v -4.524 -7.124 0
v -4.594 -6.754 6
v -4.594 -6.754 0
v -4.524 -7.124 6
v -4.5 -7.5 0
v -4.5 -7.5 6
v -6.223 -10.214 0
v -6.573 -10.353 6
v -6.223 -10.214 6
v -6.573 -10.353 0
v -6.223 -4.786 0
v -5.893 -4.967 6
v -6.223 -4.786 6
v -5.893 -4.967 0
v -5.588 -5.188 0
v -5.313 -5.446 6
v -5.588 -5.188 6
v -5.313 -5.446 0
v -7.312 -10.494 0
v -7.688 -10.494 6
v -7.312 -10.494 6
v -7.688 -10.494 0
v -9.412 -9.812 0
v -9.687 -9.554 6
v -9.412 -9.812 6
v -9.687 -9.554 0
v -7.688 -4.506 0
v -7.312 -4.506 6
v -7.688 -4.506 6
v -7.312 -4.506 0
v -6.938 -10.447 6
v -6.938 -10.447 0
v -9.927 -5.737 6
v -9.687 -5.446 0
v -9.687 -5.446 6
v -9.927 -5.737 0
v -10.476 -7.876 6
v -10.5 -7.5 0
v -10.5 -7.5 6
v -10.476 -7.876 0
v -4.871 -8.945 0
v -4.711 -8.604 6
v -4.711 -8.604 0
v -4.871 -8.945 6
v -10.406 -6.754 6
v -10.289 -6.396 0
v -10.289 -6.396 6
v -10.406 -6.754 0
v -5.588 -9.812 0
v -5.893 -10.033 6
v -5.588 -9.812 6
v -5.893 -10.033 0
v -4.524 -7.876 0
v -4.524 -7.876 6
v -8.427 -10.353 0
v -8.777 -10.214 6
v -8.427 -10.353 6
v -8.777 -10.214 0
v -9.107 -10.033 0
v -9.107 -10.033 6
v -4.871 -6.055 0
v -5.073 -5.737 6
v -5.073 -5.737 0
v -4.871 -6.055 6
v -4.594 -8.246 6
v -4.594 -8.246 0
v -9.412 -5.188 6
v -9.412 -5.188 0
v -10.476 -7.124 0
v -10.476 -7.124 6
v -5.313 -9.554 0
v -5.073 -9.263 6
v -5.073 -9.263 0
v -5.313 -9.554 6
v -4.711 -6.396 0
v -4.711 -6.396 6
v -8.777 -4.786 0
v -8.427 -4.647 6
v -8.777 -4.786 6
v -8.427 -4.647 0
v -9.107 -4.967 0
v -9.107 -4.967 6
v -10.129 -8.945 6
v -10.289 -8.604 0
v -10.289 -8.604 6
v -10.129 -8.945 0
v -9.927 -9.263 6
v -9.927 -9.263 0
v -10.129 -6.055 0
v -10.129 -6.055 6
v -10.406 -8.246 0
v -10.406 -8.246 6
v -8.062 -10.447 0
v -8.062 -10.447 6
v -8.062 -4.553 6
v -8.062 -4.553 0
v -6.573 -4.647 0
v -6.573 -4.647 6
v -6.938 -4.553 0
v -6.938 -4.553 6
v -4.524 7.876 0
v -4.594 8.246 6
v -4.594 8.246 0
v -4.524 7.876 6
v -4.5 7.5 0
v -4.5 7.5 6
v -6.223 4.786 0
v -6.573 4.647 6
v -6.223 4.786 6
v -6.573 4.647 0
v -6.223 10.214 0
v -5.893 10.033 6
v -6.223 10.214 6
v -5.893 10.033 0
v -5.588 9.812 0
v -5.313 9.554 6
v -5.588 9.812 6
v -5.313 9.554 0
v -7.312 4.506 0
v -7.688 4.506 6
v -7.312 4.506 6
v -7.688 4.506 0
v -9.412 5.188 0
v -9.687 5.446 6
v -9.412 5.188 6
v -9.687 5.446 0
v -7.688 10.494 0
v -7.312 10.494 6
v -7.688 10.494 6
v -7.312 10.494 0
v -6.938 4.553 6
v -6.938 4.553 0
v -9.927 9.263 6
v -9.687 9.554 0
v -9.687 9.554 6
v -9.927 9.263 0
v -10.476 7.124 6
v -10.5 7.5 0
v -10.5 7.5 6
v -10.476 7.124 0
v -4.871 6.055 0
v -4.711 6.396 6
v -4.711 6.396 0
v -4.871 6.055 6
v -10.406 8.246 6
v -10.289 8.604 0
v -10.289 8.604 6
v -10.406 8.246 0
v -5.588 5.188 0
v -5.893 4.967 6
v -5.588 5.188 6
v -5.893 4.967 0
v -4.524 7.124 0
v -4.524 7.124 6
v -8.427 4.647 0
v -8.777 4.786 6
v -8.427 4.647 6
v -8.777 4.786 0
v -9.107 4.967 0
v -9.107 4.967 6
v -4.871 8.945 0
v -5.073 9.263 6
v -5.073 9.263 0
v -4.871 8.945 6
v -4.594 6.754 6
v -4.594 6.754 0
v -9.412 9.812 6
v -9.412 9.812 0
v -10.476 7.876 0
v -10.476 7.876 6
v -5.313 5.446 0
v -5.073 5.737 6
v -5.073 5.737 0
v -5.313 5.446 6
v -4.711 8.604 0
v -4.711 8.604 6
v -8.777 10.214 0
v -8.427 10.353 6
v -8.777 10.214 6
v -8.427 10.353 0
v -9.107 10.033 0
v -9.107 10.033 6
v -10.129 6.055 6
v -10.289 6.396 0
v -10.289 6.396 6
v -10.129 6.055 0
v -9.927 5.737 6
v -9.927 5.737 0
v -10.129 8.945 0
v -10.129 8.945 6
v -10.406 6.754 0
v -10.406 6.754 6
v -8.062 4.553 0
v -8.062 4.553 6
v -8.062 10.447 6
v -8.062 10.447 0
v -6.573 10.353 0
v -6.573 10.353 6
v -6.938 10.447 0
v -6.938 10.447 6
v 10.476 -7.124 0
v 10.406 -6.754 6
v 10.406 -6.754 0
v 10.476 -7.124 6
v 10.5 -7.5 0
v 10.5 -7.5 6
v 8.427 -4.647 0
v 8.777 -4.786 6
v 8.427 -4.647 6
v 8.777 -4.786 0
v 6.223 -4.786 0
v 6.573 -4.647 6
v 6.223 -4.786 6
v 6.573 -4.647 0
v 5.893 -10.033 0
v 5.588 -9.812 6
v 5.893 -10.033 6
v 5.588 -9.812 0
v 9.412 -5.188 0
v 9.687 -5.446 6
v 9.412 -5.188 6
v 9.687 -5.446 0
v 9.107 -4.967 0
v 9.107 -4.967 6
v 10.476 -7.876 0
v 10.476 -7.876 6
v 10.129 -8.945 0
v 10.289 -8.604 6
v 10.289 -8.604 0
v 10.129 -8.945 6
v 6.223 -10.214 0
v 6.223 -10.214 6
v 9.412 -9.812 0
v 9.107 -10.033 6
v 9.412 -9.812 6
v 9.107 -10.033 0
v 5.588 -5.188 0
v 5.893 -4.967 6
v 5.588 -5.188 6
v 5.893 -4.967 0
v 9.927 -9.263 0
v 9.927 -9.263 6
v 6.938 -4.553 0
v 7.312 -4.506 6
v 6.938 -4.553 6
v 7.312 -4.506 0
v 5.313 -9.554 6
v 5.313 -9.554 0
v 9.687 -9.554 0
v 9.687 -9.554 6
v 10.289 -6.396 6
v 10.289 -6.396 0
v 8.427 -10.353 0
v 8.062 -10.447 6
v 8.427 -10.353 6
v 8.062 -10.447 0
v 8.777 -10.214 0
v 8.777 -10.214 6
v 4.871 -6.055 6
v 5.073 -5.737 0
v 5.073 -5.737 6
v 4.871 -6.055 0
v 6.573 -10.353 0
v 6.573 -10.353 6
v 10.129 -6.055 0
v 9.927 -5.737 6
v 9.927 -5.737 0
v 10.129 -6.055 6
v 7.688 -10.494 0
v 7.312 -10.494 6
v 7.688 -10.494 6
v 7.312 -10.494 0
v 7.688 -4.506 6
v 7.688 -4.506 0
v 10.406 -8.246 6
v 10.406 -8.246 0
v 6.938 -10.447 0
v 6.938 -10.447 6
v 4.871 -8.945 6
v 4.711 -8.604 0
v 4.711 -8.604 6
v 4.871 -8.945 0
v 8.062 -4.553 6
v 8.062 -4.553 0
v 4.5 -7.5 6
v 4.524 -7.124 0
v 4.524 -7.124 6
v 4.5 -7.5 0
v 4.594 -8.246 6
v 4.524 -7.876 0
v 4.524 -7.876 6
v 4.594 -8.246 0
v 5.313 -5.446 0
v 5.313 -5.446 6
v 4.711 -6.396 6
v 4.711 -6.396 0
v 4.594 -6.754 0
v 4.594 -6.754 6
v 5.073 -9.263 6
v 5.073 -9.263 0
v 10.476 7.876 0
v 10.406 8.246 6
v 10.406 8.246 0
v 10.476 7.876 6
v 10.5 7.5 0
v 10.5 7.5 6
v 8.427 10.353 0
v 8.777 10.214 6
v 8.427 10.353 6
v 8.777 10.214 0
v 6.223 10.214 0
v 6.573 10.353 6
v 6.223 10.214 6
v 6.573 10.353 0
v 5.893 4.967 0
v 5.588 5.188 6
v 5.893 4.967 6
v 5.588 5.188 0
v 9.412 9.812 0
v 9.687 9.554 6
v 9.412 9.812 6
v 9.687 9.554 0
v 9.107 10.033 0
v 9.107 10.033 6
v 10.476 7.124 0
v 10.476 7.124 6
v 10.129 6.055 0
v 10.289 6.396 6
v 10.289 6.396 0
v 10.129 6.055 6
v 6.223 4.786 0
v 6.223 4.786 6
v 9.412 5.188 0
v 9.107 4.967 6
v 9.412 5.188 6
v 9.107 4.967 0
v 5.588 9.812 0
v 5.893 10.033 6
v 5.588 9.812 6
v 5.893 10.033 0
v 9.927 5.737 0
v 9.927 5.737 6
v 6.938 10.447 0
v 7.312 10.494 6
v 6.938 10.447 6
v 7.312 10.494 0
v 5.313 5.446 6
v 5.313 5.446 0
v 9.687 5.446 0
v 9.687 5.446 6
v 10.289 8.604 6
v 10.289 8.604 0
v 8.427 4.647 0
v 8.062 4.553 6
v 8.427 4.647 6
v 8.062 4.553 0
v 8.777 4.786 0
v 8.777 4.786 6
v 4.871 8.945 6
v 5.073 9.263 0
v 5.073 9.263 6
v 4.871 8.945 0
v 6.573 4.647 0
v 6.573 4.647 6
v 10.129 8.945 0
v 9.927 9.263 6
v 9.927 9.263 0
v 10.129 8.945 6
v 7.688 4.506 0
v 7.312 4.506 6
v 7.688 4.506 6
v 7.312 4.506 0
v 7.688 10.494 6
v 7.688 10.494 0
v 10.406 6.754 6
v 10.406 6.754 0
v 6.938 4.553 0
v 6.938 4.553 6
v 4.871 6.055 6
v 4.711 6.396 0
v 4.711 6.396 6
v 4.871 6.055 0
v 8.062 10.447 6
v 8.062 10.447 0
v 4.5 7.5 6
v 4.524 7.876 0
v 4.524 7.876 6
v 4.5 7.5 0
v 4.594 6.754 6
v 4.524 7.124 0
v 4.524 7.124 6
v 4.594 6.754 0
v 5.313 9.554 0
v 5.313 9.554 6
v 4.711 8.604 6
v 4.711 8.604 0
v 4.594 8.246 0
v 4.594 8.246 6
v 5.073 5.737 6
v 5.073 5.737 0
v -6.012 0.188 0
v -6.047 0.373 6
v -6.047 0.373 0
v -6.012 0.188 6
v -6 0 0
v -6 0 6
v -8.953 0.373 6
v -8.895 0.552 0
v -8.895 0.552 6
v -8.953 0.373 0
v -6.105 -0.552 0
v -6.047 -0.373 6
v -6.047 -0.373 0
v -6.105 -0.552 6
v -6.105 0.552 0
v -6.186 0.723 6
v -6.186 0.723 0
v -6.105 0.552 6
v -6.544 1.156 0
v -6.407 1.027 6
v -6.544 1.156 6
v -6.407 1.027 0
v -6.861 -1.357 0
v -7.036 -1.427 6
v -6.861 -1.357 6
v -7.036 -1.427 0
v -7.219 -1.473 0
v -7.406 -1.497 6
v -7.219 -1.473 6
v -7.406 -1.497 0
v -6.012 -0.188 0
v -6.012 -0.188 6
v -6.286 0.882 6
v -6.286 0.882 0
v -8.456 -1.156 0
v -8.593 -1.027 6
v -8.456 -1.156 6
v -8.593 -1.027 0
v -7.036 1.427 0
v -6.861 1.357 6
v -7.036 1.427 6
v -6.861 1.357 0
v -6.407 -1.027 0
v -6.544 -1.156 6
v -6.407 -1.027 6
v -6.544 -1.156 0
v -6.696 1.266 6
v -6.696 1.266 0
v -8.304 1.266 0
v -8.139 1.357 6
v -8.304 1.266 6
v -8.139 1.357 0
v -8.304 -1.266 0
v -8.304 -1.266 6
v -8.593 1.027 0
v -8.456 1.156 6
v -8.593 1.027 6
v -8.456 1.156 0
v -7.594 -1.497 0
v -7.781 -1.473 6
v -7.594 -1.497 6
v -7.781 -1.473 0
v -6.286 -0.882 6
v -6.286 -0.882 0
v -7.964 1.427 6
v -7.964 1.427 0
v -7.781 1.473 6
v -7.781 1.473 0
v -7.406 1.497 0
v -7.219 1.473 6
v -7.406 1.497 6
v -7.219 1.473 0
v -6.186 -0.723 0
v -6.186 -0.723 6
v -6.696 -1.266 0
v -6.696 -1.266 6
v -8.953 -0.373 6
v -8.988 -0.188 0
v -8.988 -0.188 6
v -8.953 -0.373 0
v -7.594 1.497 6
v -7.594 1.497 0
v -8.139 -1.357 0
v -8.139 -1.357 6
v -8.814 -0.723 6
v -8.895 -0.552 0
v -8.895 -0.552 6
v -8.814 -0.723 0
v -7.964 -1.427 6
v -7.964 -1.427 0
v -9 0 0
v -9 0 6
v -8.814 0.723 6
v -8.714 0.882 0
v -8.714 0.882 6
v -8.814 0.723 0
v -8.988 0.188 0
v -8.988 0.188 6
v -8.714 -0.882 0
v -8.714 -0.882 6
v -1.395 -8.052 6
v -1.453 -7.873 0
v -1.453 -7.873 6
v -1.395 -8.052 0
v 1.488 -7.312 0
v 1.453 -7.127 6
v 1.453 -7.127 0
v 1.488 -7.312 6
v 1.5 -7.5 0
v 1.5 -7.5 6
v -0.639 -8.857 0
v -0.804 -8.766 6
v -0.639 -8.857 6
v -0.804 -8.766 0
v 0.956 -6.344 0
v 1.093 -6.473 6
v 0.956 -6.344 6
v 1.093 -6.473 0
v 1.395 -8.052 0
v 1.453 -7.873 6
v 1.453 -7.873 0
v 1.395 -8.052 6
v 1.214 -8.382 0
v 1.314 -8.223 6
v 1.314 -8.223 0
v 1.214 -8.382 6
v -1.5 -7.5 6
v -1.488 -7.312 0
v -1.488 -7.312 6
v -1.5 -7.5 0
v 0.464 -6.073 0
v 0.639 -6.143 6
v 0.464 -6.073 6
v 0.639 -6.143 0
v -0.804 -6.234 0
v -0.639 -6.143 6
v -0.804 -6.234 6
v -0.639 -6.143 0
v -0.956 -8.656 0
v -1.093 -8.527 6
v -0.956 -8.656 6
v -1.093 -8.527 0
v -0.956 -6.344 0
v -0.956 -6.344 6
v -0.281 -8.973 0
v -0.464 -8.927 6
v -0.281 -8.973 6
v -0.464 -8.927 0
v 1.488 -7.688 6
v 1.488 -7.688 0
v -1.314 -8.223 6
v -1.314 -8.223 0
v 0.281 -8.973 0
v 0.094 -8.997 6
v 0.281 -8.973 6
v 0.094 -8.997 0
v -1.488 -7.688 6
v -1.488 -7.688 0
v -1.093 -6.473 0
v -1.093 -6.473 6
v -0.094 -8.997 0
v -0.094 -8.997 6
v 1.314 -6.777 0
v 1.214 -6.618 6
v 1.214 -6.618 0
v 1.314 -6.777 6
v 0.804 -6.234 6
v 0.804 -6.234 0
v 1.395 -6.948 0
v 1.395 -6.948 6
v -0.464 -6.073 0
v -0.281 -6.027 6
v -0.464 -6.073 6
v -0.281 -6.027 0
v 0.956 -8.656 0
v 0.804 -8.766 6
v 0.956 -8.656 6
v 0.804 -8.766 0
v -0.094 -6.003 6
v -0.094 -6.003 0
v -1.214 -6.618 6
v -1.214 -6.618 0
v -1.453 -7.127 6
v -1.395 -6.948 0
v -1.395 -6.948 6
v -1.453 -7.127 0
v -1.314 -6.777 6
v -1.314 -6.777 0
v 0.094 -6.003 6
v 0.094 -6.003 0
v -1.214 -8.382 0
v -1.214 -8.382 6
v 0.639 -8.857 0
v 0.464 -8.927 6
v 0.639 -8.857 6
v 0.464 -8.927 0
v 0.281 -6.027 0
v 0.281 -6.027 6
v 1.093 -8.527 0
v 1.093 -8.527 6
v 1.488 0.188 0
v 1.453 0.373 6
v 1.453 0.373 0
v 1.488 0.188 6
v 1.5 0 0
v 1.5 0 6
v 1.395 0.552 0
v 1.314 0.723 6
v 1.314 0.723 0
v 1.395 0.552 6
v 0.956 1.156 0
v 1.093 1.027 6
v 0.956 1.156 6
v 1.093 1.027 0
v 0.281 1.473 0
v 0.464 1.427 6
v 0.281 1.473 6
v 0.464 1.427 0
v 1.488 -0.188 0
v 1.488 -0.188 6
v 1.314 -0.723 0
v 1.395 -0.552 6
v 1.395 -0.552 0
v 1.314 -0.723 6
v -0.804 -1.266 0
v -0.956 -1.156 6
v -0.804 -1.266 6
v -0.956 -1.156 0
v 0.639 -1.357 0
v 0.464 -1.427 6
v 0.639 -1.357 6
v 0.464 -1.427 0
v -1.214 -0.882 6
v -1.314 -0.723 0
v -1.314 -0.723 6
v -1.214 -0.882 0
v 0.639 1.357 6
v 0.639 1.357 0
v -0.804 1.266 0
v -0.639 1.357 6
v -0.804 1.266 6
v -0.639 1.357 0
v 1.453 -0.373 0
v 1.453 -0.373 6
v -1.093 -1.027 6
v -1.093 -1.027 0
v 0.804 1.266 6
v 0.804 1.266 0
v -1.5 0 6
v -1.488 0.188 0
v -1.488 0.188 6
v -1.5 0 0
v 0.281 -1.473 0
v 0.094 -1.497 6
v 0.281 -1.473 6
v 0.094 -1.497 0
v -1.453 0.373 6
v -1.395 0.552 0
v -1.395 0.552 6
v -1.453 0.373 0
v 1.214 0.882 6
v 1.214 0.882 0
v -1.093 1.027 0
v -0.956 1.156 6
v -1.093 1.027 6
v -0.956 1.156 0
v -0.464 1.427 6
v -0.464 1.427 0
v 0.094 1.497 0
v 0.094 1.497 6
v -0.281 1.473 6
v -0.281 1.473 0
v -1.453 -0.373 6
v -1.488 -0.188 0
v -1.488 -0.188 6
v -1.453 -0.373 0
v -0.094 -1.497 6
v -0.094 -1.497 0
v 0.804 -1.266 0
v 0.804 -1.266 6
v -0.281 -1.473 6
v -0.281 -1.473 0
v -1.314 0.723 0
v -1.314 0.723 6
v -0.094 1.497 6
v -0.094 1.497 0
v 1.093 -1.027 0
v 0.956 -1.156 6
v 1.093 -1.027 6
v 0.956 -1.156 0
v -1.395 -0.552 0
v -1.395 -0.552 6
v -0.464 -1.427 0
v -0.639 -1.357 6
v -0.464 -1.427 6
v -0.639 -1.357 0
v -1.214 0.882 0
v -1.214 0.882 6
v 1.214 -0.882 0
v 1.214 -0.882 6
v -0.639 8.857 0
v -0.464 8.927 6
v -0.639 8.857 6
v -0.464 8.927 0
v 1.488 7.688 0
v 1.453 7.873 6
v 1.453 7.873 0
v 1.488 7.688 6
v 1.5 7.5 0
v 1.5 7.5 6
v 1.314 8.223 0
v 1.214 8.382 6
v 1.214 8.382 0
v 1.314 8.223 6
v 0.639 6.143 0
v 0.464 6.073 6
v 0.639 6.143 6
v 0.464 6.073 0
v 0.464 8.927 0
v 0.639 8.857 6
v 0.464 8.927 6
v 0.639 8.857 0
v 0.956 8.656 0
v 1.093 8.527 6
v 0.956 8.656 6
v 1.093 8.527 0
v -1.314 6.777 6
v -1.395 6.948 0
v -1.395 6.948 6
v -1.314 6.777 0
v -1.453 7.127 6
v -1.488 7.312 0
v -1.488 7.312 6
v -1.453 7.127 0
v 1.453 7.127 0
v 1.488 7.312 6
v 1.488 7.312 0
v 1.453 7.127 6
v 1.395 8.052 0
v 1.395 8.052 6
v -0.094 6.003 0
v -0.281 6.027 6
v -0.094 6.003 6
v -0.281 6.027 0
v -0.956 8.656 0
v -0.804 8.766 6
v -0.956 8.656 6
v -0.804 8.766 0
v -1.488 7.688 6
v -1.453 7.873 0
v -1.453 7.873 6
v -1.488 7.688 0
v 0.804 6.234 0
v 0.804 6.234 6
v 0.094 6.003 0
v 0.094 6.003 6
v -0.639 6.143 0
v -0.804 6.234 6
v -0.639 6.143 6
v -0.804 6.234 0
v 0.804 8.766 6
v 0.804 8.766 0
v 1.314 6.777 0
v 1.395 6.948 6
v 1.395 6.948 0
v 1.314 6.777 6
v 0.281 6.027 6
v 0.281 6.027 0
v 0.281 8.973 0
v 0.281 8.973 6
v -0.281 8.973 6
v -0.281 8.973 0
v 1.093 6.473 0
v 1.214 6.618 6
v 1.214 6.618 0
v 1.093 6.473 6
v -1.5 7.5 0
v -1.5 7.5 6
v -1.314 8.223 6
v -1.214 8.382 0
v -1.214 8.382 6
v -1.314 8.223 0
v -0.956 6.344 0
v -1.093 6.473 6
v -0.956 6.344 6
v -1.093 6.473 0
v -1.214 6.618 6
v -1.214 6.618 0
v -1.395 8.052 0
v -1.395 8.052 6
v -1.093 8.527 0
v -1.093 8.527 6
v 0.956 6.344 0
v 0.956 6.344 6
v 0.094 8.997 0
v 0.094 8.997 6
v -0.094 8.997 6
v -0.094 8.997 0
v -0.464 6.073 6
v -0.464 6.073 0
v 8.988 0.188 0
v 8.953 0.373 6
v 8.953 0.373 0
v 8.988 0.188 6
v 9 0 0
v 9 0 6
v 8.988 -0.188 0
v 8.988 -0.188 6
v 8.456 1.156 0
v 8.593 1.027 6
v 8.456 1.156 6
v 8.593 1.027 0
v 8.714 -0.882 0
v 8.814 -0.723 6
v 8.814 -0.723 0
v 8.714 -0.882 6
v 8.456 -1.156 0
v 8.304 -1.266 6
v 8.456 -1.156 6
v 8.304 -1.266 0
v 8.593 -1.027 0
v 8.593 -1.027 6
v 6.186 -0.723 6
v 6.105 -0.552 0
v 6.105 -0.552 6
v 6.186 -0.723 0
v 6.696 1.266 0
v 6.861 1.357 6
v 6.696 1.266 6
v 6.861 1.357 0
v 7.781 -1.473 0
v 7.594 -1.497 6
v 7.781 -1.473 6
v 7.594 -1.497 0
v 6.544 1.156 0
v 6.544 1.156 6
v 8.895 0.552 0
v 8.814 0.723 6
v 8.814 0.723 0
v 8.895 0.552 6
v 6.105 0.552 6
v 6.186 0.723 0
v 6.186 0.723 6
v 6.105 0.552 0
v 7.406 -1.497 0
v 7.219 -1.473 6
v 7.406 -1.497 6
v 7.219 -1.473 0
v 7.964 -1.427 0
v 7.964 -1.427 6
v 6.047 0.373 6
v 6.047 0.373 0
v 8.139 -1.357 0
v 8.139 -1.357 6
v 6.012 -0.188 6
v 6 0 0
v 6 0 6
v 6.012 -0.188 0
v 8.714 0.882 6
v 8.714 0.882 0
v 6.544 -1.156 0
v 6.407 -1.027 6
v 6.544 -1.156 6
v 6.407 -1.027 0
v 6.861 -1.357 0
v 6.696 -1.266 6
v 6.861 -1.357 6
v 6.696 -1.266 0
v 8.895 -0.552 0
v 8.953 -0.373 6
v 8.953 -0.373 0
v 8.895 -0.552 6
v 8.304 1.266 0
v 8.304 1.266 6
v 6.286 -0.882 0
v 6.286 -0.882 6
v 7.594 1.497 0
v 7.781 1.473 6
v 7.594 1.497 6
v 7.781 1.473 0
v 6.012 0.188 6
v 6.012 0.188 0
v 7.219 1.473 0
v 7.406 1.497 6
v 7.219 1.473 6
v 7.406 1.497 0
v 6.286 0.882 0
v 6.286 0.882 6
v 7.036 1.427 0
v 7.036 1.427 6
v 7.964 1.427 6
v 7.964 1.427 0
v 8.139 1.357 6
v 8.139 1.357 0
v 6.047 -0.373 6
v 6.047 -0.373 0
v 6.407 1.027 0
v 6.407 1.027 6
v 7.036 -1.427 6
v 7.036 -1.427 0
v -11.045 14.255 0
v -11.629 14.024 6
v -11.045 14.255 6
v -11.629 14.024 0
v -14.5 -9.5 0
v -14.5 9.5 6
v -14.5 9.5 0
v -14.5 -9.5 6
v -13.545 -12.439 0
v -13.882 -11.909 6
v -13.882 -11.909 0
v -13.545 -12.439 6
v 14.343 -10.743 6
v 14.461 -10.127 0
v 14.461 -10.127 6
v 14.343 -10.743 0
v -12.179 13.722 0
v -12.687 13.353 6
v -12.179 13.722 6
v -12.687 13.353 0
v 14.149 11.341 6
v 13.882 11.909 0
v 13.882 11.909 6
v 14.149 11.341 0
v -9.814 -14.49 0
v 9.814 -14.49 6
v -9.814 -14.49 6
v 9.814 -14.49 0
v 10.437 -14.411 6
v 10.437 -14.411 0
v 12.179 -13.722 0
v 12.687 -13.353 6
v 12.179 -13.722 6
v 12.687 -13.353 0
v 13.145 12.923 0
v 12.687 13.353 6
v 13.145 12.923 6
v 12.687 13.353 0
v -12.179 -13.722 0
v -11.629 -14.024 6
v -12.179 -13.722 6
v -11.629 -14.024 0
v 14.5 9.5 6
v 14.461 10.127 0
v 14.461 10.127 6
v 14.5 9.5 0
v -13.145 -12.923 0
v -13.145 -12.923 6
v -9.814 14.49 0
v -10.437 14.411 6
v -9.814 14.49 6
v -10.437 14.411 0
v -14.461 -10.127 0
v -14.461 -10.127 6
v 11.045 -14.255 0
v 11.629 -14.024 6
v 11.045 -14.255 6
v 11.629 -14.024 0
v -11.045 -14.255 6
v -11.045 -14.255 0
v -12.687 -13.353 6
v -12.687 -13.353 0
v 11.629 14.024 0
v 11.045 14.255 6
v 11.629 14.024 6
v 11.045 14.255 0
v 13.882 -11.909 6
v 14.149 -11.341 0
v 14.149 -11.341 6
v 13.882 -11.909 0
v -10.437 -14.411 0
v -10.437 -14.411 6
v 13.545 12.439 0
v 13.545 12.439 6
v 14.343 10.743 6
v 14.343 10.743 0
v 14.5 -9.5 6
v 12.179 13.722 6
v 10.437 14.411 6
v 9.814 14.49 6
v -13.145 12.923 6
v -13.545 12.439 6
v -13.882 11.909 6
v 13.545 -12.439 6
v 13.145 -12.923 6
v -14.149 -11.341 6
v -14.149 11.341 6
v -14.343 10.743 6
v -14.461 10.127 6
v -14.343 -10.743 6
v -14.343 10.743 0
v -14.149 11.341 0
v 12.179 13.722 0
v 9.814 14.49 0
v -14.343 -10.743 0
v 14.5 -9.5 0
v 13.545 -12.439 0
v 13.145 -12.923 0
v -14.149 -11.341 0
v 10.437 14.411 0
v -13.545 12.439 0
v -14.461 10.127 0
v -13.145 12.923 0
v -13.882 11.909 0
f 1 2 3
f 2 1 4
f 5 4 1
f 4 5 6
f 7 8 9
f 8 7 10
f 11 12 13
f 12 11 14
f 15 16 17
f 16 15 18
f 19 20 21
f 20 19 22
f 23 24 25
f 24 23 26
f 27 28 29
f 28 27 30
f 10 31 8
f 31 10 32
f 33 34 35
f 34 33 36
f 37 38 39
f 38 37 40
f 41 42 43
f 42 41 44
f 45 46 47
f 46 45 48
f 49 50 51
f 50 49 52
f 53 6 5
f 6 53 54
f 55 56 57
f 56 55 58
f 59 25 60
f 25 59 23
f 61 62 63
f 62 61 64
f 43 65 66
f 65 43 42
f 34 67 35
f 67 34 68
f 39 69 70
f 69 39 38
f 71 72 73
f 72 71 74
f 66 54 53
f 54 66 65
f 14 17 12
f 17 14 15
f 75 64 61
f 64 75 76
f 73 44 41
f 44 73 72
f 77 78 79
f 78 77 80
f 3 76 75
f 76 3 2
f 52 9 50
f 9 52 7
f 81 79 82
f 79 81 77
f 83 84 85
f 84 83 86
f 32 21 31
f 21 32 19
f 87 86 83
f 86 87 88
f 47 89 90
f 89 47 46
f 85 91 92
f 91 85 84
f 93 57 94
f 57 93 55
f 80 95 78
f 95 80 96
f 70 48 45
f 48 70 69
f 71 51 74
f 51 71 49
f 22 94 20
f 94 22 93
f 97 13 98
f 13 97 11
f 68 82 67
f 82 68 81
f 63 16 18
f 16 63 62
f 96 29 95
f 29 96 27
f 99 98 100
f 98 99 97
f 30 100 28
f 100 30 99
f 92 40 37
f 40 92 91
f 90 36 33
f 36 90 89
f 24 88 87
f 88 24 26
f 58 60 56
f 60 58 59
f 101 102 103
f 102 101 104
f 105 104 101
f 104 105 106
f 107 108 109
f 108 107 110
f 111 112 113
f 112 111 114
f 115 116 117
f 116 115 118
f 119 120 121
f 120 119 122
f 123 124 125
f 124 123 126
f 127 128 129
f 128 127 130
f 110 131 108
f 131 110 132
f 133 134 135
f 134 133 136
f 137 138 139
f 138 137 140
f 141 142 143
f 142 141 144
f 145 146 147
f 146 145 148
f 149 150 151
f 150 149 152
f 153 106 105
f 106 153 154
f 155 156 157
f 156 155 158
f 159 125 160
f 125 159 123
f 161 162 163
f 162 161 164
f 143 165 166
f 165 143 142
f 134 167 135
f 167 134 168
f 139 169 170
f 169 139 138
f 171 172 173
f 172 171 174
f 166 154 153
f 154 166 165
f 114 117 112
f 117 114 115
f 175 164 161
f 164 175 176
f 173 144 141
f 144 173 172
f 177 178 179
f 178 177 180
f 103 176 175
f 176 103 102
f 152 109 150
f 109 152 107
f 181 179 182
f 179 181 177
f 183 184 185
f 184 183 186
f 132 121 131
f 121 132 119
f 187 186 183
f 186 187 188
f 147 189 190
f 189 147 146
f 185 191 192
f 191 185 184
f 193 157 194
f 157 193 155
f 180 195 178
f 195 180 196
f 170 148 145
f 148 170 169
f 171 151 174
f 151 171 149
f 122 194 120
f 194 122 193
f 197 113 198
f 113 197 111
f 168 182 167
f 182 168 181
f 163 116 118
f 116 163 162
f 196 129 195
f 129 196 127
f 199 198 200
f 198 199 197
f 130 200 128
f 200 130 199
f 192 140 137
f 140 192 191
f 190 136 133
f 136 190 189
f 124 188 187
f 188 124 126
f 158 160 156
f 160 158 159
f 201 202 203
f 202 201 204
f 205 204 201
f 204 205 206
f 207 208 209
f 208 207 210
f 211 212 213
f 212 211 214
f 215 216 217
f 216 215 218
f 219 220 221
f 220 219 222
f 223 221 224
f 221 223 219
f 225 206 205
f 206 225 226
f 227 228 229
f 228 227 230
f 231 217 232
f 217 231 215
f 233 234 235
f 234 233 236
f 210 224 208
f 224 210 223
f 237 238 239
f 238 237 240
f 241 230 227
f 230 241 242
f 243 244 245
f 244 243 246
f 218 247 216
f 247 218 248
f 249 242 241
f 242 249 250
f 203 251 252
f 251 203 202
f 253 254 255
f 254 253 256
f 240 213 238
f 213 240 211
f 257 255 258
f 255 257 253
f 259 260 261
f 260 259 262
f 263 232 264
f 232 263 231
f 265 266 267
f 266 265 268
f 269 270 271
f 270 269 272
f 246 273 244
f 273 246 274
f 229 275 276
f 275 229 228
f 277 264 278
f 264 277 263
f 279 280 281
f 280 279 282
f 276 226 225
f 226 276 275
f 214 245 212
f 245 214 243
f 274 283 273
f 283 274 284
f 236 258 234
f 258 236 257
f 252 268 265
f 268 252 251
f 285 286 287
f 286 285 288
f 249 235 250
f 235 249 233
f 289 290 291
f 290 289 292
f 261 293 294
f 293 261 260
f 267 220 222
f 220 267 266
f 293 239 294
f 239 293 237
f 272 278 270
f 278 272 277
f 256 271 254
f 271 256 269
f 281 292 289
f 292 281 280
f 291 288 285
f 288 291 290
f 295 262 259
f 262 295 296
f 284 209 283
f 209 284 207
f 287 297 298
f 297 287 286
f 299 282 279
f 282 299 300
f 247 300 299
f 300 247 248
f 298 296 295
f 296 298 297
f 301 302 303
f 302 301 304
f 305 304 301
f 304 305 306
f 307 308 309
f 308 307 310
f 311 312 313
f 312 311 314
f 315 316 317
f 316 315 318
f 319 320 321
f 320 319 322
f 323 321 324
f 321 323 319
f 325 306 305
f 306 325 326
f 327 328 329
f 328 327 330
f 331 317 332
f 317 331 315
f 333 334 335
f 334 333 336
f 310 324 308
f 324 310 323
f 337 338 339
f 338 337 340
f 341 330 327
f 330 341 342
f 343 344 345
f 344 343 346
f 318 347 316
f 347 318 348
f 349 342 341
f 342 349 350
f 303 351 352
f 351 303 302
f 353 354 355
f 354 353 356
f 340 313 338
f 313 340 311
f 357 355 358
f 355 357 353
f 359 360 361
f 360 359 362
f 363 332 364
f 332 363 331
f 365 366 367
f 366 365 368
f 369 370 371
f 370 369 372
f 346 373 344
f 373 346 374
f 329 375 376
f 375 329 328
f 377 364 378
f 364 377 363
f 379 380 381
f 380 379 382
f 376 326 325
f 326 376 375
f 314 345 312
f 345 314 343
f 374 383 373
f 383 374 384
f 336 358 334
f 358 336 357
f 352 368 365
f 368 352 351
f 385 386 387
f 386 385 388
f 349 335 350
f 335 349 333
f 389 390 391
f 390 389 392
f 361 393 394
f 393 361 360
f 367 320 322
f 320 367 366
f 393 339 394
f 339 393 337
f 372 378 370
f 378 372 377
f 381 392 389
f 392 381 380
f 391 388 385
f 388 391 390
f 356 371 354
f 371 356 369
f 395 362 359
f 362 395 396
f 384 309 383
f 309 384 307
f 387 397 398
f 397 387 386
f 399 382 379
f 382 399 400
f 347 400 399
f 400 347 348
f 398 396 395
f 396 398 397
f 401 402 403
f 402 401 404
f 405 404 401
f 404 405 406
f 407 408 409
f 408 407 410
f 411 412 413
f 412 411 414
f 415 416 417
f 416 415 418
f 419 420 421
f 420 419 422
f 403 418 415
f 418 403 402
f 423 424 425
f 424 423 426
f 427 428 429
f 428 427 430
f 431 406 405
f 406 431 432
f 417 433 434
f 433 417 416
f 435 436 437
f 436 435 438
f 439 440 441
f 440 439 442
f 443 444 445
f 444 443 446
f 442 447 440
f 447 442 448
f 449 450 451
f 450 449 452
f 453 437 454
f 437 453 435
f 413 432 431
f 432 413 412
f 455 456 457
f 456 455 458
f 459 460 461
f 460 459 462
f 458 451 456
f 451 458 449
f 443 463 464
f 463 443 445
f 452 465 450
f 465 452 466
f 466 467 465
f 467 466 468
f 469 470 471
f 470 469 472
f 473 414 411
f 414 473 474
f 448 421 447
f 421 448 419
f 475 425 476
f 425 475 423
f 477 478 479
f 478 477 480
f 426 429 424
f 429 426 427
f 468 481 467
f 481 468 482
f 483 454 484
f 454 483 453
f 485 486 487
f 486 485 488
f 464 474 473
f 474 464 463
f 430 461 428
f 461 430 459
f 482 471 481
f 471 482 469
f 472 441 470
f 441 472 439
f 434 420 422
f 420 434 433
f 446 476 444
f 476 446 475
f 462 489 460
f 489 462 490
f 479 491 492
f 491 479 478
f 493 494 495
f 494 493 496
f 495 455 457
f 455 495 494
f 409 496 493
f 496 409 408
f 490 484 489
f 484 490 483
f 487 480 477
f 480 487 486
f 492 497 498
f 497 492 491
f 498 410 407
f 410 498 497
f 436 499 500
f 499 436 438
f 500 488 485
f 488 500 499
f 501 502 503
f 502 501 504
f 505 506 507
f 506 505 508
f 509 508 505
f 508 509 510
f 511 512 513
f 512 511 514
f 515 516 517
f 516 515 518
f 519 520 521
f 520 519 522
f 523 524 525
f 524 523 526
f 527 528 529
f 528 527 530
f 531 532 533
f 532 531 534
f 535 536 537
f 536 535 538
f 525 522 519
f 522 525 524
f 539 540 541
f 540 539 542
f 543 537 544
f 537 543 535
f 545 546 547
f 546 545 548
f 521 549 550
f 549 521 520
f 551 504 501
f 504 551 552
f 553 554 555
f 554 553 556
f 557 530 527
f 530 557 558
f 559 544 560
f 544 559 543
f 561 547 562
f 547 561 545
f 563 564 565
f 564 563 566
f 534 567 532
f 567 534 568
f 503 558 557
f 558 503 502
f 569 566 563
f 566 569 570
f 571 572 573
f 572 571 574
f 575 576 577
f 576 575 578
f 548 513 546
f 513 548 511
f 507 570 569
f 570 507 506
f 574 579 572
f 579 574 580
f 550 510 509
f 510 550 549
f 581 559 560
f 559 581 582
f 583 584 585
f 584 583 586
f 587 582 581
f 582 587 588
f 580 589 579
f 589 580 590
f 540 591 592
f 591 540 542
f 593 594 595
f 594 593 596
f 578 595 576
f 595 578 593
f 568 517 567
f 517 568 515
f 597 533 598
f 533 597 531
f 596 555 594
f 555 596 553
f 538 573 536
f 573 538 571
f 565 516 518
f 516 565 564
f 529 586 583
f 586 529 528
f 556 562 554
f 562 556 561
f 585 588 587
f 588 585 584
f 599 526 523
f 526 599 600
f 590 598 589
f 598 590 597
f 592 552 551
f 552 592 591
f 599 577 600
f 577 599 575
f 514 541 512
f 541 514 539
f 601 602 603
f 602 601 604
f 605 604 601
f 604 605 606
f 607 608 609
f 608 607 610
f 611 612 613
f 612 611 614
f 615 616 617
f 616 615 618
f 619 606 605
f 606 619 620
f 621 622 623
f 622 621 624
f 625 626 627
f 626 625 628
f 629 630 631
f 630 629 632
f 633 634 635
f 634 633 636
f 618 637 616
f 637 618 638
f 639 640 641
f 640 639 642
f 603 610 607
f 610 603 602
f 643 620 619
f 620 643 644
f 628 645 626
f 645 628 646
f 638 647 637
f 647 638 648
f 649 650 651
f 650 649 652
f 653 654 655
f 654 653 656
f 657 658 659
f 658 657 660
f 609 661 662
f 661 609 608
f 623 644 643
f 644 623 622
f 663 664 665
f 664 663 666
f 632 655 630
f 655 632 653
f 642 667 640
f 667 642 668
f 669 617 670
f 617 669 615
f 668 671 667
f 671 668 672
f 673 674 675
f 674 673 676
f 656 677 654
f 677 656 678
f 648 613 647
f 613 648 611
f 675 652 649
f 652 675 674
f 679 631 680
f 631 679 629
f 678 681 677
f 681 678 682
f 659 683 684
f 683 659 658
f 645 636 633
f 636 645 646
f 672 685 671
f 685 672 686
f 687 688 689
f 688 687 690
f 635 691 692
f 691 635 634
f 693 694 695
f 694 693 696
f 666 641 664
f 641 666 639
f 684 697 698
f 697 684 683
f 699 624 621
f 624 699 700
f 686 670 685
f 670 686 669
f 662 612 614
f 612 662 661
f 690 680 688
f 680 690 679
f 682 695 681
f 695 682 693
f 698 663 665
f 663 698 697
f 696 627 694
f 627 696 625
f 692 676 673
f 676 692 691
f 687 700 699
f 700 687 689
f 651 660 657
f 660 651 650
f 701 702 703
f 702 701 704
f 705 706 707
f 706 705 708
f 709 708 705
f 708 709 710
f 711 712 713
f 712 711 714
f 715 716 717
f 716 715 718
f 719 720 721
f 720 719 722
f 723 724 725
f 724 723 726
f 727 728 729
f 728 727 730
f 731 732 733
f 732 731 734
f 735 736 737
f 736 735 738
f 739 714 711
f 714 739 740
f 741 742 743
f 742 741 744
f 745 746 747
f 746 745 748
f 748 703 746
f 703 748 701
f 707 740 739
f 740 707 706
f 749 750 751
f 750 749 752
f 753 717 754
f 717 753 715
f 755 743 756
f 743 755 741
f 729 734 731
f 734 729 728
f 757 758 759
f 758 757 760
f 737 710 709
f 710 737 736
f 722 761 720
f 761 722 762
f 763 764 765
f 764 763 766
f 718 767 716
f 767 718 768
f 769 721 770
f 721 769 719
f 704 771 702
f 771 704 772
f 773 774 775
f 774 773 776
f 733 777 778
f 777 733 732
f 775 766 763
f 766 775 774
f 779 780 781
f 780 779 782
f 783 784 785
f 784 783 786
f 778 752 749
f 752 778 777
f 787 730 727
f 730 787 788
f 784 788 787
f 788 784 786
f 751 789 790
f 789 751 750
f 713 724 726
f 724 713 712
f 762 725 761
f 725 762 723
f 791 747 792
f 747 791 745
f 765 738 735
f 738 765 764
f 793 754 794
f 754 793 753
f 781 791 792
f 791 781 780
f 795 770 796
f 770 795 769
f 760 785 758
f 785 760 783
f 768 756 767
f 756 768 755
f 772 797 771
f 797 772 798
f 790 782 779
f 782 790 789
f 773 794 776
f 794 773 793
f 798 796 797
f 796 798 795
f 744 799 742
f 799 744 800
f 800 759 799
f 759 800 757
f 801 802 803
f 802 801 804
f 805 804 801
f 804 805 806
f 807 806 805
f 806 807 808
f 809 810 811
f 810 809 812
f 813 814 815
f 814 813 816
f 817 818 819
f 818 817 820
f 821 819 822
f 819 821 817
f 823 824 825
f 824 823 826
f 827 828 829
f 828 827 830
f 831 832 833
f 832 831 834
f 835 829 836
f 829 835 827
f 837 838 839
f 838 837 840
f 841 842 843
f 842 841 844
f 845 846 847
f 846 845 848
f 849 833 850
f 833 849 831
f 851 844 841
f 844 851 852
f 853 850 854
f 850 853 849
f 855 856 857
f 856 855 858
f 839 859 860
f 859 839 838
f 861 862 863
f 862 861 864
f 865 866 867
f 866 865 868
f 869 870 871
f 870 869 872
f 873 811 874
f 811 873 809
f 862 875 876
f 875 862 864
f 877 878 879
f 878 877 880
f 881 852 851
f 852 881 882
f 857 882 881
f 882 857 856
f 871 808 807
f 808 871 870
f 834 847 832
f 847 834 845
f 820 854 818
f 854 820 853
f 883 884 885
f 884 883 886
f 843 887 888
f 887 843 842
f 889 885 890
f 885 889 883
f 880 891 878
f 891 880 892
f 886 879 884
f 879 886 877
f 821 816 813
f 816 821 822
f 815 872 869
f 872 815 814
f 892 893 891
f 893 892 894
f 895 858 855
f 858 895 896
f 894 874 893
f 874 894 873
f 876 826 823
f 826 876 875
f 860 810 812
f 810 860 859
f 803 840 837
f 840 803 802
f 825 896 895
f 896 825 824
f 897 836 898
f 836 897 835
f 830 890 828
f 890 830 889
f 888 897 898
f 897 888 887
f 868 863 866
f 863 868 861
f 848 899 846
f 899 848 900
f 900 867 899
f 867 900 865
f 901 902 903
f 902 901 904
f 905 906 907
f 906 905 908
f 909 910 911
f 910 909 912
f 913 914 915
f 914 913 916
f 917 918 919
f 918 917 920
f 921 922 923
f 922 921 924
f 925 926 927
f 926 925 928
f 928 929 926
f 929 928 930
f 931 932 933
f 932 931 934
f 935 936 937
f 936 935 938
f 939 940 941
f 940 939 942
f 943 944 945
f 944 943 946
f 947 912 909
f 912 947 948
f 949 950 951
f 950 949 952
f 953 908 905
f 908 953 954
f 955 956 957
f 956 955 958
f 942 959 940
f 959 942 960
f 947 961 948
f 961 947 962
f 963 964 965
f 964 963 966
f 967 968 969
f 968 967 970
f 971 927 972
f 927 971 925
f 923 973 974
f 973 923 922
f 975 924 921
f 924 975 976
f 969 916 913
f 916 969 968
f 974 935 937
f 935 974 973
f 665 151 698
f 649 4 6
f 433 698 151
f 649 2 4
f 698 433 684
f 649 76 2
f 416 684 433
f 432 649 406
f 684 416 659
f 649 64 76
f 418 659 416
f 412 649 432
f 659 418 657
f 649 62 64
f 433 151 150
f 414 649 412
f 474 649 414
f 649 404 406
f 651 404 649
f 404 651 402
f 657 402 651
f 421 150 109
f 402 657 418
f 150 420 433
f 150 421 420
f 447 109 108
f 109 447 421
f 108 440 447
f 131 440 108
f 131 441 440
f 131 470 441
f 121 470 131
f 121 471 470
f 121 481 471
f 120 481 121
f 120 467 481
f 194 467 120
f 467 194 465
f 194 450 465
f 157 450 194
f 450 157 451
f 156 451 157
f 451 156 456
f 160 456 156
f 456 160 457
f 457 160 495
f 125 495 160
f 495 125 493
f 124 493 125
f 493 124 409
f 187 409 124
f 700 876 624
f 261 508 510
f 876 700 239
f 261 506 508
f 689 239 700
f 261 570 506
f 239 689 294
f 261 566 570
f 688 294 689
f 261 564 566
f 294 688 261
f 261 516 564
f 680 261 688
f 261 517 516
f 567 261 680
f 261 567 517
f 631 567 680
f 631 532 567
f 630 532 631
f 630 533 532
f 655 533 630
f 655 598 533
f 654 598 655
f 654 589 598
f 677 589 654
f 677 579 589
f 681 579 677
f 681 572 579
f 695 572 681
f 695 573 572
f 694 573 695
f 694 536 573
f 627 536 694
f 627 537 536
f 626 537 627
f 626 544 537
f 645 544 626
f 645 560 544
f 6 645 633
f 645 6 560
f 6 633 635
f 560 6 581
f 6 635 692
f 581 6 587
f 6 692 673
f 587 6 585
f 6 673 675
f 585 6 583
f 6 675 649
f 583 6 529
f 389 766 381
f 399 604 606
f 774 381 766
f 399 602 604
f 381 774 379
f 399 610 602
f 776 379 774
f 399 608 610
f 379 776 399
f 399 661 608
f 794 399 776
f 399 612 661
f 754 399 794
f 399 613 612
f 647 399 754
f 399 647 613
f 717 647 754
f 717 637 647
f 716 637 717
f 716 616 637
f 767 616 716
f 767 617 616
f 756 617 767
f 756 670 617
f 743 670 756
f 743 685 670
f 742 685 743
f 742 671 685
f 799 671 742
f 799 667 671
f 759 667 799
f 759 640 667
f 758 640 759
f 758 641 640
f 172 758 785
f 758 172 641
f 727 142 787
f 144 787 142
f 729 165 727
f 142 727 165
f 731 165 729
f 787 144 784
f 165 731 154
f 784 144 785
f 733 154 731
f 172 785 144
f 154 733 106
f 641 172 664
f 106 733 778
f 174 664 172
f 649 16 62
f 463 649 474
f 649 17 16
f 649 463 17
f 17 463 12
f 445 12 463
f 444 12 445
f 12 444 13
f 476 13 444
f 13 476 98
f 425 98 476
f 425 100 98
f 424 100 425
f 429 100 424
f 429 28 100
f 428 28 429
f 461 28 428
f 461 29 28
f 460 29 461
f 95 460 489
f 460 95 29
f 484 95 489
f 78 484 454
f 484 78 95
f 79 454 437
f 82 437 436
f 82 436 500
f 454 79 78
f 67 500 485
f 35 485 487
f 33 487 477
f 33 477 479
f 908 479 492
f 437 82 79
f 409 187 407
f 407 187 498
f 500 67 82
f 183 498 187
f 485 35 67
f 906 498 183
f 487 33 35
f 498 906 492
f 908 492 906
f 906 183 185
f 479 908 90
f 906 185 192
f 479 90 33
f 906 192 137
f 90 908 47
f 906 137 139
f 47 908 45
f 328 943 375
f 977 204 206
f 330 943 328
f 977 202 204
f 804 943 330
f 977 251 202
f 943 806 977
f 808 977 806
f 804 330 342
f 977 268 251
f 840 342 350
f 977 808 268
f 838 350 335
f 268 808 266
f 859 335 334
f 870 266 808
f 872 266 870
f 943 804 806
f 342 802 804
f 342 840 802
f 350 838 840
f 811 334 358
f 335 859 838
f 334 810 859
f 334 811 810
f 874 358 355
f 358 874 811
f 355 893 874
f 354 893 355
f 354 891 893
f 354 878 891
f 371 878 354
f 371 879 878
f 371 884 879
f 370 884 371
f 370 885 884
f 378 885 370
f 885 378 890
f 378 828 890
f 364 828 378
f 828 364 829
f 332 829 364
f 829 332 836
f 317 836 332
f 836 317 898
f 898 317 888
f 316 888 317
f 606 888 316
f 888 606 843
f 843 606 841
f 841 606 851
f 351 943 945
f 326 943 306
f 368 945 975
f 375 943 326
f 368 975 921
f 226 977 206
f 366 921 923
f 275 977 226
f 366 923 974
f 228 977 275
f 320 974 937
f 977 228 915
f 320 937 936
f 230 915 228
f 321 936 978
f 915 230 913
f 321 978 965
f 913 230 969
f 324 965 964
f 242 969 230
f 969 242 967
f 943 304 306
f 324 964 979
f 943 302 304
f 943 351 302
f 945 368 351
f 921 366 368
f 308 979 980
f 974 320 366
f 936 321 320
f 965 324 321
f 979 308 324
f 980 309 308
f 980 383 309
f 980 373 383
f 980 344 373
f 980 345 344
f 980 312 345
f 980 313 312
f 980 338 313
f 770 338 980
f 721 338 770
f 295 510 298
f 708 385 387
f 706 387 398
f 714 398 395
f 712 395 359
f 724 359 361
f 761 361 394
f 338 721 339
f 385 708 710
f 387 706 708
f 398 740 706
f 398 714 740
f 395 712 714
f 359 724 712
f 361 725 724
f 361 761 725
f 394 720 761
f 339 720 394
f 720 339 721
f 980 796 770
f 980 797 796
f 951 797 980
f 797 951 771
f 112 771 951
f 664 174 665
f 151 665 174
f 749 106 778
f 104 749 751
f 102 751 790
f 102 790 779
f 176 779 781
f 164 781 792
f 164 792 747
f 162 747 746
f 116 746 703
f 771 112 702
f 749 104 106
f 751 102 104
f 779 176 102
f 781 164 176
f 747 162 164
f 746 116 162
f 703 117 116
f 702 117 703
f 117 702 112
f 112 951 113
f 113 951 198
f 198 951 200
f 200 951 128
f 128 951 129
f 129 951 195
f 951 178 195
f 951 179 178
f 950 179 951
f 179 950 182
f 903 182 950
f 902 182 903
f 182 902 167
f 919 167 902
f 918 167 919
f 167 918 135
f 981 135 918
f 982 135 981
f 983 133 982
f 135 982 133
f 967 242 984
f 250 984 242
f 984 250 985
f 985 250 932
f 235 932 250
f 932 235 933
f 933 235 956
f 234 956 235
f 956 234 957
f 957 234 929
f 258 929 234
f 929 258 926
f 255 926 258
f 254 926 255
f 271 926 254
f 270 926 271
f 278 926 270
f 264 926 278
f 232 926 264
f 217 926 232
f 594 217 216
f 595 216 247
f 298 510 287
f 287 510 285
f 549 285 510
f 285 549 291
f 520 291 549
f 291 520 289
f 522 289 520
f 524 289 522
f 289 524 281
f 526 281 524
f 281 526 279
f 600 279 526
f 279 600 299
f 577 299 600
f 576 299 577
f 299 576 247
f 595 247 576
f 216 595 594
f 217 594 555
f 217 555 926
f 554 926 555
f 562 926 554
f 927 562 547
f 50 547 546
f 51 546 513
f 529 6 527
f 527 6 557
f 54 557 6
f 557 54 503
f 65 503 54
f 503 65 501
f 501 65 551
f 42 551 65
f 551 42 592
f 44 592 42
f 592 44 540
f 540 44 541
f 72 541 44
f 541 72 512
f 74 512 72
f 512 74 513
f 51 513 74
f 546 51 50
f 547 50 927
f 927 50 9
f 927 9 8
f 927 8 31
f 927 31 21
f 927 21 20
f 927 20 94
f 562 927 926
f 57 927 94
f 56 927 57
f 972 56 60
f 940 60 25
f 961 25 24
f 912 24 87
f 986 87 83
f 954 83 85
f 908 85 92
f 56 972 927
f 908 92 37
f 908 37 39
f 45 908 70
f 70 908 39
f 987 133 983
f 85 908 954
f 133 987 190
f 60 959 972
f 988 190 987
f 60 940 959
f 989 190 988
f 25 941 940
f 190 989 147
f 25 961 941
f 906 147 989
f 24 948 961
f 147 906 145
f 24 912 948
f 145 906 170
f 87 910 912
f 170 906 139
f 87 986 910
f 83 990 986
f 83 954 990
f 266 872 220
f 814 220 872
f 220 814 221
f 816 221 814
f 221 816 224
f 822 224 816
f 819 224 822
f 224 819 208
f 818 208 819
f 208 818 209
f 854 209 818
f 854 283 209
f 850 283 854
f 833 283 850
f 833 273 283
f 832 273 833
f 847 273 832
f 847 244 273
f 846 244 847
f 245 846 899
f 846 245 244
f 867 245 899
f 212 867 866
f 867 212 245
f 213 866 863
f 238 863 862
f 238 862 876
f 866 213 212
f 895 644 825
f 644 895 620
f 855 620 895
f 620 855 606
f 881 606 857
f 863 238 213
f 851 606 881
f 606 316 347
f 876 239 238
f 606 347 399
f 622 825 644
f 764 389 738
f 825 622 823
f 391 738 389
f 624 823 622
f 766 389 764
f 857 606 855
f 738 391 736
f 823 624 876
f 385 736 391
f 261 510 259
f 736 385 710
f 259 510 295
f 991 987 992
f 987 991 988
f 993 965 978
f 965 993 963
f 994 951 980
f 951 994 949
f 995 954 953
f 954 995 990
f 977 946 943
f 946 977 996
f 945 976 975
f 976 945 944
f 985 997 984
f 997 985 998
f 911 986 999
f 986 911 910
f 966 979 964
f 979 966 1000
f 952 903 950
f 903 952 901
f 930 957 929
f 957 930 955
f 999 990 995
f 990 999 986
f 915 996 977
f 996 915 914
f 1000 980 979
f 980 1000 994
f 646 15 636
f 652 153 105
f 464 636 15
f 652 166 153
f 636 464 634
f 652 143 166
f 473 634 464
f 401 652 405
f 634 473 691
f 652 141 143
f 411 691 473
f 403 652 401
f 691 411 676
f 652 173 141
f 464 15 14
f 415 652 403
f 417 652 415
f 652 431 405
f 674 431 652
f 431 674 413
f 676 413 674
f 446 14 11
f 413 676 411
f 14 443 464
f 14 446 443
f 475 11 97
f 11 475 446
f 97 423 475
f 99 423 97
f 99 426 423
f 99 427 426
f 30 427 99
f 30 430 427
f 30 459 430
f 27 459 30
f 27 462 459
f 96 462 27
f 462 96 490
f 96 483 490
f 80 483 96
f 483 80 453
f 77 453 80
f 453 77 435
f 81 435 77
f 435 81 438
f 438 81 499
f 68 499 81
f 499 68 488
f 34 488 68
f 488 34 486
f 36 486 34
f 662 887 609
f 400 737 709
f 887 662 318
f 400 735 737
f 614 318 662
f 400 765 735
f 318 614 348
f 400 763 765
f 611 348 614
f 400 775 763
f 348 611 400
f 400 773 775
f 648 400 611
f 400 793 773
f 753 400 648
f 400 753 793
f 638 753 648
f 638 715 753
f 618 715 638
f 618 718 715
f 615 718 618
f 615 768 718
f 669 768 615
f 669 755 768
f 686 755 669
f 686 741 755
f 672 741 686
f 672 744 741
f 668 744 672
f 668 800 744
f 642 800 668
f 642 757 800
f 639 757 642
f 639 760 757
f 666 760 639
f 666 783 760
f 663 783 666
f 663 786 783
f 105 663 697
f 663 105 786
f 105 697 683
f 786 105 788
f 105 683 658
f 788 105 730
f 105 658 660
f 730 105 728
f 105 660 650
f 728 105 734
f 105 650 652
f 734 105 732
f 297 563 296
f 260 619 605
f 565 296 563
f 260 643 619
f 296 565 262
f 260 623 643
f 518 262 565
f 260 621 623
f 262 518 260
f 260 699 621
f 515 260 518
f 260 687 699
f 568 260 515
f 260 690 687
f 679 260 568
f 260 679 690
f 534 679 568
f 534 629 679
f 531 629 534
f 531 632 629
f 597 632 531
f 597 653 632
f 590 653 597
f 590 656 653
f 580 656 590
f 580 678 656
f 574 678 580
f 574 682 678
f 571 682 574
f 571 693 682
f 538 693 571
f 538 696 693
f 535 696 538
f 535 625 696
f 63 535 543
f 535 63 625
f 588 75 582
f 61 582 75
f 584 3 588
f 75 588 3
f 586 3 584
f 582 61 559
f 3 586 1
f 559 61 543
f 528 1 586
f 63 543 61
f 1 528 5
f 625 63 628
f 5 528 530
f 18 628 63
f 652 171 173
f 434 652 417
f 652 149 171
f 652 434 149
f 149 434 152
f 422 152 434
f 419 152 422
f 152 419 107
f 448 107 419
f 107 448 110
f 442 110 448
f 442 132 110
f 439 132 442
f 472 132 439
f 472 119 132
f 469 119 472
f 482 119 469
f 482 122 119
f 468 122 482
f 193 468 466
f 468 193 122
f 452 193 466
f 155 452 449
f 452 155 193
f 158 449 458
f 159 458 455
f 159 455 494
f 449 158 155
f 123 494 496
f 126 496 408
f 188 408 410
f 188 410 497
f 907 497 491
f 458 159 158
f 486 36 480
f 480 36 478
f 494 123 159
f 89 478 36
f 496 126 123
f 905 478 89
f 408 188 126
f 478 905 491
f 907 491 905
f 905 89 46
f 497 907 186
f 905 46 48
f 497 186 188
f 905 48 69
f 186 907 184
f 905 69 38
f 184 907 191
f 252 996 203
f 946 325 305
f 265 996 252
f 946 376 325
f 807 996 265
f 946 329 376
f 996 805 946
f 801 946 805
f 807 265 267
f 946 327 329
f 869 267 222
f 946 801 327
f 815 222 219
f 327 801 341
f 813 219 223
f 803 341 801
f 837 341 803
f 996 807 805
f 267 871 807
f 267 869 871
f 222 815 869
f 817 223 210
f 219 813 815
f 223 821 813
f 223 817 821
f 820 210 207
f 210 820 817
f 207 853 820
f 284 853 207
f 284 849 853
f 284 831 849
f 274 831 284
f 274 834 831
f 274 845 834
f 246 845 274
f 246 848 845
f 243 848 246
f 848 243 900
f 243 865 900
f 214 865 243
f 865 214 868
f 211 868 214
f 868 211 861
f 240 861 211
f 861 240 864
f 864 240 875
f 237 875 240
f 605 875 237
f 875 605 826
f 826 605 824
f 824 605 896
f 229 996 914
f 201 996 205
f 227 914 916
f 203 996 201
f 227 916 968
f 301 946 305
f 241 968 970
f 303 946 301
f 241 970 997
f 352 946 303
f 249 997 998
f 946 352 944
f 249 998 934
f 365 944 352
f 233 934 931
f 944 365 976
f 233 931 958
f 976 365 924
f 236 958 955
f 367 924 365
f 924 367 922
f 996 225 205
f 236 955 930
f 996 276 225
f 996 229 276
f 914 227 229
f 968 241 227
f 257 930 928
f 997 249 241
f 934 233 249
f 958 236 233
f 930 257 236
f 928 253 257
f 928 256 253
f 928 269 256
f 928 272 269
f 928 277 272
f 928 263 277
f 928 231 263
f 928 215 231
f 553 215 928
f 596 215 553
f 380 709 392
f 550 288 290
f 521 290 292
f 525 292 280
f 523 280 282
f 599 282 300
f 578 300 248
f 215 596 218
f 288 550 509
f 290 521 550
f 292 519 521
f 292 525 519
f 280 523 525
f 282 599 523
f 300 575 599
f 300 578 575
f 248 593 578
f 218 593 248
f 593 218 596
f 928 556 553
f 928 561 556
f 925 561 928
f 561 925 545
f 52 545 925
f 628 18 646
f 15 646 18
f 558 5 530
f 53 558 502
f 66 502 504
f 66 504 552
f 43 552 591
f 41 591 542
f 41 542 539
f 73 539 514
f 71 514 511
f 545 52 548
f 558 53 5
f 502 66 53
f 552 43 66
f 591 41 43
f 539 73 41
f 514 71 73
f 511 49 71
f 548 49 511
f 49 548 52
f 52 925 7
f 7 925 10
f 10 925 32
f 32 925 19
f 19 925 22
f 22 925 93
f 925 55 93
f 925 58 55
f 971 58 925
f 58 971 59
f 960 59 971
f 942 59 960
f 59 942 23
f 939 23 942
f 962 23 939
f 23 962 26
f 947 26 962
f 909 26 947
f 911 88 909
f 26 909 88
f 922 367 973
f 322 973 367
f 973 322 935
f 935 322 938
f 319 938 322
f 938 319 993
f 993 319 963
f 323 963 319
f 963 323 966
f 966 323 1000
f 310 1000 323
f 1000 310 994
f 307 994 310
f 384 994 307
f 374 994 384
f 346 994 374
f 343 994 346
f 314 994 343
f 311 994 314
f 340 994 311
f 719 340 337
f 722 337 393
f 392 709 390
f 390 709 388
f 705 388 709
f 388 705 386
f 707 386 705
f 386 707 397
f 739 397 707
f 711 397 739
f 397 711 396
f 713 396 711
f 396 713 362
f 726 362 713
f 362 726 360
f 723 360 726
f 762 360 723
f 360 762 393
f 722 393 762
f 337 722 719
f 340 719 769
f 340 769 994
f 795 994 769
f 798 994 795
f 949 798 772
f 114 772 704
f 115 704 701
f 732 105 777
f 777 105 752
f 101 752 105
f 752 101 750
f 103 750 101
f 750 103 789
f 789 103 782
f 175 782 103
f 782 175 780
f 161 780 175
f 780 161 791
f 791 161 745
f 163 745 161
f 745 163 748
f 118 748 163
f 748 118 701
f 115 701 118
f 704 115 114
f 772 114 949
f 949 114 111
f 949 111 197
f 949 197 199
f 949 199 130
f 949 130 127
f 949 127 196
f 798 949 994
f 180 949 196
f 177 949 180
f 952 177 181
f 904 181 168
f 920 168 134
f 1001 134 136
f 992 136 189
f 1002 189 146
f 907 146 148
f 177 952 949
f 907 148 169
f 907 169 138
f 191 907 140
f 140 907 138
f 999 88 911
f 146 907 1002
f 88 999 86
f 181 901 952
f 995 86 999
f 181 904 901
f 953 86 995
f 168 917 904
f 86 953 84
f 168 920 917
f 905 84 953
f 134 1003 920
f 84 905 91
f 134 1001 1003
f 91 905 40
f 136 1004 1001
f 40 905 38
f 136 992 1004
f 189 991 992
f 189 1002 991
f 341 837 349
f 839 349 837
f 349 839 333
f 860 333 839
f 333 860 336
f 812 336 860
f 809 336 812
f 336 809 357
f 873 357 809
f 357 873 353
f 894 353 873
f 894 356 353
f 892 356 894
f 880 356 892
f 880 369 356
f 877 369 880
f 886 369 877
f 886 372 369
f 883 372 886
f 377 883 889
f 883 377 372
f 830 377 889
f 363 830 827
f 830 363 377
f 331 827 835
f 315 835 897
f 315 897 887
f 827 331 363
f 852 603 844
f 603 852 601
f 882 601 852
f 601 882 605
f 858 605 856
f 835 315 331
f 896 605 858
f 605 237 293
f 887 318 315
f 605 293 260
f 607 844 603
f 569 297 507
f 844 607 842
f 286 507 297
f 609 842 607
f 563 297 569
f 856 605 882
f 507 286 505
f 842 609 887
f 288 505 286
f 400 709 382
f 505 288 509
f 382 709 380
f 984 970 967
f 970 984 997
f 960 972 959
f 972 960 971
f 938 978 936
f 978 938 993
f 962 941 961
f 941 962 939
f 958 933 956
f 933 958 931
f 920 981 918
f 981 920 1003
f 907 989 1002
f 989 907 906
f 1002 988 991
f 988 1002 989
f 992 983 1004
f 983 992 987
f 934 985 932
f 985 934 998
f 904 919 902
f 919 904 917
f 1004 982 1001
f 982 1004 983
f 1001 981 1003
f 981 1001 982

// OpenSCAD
$fn = 50;

difference() {
	union() {
		hull() {
			translate(v = [-9.5, 9.5, 0]) {
				cylinder(h = 6, r = 5);
			}
			translate(v = [9.5, 9.5, 0]) {
				cylinder(h = 6, r = 5);
			}
			translate(v = [-9.5, -9.5, 0]) {
				cylinder(h = 6, r = 5);
			}
			translate(v = [9.5, -9.5, 0]) {
				cylinder(h = 6, r = 5);
			}
		}
	}
	union() {
		translate(v = [-7.5, -7.5, 0]) {
			translate(v = [0, 0, -100]) {
				cylinder(h = 200, r = 3.0);
			}
		}
		translate(v = [-7.5, 7.5, 0]) {
			translate(v = [0, 0, -100]) {
				cylinder(h = 200, r = 3.0);
			}
		}
		translate(v = [7.5, -7.5, 0]) {
			translate(v = [0, 0, -100]) {
				cylinder(h = 200, r = 3.0);
			}
		}
		translate(v = [7.5, 7.5, 0]) {
			translate(v = [0, 0, -100]) {
				cylinder(h = 200, r = 3.0);
			}
		}
		translate(v = [-7.5, -7.5, 0]) {
			translate(v = [0, 0, -100]) {
				cylinder(h = 200, r = 1.5);
			}
		}
		translate(v = [-7.5, 0.0, 0]) {
			translate(v = [0, 0, -100]) {
				cylinder(h = 200, r = 1.5);
			}
		}
		translate(v = [-7.5, 7.5, 0]) {
			translate(v = [0, 0, -100]) {
				cylinder(h = 200, r = 1.5);
			}
		}
		translate(v = [0.0, -7.5, 0]) {
			translate(v = [0, 0, -100]) {
				cylinder(h = 200, r = 1.5);
			}
		}
		translate(v = [0, 0, -100]) {
			cylinder(h = 200, r = 1.5);
		}
		translate(v = [0.0, 7.5, 0]) {
			translate(v = [0, 0, -100]) {
				cylinder(h = 200, r = 1.5);
			}
		}
		translate(v = [7.5, -7.5, 0]) {
			translate(v = [0, 0, -100]) {
				cylinder(h = 200, r = 1.5);
			}
		}
		translate(v = [7.5, 0.0, 0]) {
			translate(v = [0, 0, -100]) {
				cylinder(h = 200, r = 1.5);
			}
		}
		translate(v = [7.5, 7.5, 0]) {
			translate(v = [0, 0, -100]) {
				cylinder(h = 200, r = 1.5);
			}
		}
	}
}
